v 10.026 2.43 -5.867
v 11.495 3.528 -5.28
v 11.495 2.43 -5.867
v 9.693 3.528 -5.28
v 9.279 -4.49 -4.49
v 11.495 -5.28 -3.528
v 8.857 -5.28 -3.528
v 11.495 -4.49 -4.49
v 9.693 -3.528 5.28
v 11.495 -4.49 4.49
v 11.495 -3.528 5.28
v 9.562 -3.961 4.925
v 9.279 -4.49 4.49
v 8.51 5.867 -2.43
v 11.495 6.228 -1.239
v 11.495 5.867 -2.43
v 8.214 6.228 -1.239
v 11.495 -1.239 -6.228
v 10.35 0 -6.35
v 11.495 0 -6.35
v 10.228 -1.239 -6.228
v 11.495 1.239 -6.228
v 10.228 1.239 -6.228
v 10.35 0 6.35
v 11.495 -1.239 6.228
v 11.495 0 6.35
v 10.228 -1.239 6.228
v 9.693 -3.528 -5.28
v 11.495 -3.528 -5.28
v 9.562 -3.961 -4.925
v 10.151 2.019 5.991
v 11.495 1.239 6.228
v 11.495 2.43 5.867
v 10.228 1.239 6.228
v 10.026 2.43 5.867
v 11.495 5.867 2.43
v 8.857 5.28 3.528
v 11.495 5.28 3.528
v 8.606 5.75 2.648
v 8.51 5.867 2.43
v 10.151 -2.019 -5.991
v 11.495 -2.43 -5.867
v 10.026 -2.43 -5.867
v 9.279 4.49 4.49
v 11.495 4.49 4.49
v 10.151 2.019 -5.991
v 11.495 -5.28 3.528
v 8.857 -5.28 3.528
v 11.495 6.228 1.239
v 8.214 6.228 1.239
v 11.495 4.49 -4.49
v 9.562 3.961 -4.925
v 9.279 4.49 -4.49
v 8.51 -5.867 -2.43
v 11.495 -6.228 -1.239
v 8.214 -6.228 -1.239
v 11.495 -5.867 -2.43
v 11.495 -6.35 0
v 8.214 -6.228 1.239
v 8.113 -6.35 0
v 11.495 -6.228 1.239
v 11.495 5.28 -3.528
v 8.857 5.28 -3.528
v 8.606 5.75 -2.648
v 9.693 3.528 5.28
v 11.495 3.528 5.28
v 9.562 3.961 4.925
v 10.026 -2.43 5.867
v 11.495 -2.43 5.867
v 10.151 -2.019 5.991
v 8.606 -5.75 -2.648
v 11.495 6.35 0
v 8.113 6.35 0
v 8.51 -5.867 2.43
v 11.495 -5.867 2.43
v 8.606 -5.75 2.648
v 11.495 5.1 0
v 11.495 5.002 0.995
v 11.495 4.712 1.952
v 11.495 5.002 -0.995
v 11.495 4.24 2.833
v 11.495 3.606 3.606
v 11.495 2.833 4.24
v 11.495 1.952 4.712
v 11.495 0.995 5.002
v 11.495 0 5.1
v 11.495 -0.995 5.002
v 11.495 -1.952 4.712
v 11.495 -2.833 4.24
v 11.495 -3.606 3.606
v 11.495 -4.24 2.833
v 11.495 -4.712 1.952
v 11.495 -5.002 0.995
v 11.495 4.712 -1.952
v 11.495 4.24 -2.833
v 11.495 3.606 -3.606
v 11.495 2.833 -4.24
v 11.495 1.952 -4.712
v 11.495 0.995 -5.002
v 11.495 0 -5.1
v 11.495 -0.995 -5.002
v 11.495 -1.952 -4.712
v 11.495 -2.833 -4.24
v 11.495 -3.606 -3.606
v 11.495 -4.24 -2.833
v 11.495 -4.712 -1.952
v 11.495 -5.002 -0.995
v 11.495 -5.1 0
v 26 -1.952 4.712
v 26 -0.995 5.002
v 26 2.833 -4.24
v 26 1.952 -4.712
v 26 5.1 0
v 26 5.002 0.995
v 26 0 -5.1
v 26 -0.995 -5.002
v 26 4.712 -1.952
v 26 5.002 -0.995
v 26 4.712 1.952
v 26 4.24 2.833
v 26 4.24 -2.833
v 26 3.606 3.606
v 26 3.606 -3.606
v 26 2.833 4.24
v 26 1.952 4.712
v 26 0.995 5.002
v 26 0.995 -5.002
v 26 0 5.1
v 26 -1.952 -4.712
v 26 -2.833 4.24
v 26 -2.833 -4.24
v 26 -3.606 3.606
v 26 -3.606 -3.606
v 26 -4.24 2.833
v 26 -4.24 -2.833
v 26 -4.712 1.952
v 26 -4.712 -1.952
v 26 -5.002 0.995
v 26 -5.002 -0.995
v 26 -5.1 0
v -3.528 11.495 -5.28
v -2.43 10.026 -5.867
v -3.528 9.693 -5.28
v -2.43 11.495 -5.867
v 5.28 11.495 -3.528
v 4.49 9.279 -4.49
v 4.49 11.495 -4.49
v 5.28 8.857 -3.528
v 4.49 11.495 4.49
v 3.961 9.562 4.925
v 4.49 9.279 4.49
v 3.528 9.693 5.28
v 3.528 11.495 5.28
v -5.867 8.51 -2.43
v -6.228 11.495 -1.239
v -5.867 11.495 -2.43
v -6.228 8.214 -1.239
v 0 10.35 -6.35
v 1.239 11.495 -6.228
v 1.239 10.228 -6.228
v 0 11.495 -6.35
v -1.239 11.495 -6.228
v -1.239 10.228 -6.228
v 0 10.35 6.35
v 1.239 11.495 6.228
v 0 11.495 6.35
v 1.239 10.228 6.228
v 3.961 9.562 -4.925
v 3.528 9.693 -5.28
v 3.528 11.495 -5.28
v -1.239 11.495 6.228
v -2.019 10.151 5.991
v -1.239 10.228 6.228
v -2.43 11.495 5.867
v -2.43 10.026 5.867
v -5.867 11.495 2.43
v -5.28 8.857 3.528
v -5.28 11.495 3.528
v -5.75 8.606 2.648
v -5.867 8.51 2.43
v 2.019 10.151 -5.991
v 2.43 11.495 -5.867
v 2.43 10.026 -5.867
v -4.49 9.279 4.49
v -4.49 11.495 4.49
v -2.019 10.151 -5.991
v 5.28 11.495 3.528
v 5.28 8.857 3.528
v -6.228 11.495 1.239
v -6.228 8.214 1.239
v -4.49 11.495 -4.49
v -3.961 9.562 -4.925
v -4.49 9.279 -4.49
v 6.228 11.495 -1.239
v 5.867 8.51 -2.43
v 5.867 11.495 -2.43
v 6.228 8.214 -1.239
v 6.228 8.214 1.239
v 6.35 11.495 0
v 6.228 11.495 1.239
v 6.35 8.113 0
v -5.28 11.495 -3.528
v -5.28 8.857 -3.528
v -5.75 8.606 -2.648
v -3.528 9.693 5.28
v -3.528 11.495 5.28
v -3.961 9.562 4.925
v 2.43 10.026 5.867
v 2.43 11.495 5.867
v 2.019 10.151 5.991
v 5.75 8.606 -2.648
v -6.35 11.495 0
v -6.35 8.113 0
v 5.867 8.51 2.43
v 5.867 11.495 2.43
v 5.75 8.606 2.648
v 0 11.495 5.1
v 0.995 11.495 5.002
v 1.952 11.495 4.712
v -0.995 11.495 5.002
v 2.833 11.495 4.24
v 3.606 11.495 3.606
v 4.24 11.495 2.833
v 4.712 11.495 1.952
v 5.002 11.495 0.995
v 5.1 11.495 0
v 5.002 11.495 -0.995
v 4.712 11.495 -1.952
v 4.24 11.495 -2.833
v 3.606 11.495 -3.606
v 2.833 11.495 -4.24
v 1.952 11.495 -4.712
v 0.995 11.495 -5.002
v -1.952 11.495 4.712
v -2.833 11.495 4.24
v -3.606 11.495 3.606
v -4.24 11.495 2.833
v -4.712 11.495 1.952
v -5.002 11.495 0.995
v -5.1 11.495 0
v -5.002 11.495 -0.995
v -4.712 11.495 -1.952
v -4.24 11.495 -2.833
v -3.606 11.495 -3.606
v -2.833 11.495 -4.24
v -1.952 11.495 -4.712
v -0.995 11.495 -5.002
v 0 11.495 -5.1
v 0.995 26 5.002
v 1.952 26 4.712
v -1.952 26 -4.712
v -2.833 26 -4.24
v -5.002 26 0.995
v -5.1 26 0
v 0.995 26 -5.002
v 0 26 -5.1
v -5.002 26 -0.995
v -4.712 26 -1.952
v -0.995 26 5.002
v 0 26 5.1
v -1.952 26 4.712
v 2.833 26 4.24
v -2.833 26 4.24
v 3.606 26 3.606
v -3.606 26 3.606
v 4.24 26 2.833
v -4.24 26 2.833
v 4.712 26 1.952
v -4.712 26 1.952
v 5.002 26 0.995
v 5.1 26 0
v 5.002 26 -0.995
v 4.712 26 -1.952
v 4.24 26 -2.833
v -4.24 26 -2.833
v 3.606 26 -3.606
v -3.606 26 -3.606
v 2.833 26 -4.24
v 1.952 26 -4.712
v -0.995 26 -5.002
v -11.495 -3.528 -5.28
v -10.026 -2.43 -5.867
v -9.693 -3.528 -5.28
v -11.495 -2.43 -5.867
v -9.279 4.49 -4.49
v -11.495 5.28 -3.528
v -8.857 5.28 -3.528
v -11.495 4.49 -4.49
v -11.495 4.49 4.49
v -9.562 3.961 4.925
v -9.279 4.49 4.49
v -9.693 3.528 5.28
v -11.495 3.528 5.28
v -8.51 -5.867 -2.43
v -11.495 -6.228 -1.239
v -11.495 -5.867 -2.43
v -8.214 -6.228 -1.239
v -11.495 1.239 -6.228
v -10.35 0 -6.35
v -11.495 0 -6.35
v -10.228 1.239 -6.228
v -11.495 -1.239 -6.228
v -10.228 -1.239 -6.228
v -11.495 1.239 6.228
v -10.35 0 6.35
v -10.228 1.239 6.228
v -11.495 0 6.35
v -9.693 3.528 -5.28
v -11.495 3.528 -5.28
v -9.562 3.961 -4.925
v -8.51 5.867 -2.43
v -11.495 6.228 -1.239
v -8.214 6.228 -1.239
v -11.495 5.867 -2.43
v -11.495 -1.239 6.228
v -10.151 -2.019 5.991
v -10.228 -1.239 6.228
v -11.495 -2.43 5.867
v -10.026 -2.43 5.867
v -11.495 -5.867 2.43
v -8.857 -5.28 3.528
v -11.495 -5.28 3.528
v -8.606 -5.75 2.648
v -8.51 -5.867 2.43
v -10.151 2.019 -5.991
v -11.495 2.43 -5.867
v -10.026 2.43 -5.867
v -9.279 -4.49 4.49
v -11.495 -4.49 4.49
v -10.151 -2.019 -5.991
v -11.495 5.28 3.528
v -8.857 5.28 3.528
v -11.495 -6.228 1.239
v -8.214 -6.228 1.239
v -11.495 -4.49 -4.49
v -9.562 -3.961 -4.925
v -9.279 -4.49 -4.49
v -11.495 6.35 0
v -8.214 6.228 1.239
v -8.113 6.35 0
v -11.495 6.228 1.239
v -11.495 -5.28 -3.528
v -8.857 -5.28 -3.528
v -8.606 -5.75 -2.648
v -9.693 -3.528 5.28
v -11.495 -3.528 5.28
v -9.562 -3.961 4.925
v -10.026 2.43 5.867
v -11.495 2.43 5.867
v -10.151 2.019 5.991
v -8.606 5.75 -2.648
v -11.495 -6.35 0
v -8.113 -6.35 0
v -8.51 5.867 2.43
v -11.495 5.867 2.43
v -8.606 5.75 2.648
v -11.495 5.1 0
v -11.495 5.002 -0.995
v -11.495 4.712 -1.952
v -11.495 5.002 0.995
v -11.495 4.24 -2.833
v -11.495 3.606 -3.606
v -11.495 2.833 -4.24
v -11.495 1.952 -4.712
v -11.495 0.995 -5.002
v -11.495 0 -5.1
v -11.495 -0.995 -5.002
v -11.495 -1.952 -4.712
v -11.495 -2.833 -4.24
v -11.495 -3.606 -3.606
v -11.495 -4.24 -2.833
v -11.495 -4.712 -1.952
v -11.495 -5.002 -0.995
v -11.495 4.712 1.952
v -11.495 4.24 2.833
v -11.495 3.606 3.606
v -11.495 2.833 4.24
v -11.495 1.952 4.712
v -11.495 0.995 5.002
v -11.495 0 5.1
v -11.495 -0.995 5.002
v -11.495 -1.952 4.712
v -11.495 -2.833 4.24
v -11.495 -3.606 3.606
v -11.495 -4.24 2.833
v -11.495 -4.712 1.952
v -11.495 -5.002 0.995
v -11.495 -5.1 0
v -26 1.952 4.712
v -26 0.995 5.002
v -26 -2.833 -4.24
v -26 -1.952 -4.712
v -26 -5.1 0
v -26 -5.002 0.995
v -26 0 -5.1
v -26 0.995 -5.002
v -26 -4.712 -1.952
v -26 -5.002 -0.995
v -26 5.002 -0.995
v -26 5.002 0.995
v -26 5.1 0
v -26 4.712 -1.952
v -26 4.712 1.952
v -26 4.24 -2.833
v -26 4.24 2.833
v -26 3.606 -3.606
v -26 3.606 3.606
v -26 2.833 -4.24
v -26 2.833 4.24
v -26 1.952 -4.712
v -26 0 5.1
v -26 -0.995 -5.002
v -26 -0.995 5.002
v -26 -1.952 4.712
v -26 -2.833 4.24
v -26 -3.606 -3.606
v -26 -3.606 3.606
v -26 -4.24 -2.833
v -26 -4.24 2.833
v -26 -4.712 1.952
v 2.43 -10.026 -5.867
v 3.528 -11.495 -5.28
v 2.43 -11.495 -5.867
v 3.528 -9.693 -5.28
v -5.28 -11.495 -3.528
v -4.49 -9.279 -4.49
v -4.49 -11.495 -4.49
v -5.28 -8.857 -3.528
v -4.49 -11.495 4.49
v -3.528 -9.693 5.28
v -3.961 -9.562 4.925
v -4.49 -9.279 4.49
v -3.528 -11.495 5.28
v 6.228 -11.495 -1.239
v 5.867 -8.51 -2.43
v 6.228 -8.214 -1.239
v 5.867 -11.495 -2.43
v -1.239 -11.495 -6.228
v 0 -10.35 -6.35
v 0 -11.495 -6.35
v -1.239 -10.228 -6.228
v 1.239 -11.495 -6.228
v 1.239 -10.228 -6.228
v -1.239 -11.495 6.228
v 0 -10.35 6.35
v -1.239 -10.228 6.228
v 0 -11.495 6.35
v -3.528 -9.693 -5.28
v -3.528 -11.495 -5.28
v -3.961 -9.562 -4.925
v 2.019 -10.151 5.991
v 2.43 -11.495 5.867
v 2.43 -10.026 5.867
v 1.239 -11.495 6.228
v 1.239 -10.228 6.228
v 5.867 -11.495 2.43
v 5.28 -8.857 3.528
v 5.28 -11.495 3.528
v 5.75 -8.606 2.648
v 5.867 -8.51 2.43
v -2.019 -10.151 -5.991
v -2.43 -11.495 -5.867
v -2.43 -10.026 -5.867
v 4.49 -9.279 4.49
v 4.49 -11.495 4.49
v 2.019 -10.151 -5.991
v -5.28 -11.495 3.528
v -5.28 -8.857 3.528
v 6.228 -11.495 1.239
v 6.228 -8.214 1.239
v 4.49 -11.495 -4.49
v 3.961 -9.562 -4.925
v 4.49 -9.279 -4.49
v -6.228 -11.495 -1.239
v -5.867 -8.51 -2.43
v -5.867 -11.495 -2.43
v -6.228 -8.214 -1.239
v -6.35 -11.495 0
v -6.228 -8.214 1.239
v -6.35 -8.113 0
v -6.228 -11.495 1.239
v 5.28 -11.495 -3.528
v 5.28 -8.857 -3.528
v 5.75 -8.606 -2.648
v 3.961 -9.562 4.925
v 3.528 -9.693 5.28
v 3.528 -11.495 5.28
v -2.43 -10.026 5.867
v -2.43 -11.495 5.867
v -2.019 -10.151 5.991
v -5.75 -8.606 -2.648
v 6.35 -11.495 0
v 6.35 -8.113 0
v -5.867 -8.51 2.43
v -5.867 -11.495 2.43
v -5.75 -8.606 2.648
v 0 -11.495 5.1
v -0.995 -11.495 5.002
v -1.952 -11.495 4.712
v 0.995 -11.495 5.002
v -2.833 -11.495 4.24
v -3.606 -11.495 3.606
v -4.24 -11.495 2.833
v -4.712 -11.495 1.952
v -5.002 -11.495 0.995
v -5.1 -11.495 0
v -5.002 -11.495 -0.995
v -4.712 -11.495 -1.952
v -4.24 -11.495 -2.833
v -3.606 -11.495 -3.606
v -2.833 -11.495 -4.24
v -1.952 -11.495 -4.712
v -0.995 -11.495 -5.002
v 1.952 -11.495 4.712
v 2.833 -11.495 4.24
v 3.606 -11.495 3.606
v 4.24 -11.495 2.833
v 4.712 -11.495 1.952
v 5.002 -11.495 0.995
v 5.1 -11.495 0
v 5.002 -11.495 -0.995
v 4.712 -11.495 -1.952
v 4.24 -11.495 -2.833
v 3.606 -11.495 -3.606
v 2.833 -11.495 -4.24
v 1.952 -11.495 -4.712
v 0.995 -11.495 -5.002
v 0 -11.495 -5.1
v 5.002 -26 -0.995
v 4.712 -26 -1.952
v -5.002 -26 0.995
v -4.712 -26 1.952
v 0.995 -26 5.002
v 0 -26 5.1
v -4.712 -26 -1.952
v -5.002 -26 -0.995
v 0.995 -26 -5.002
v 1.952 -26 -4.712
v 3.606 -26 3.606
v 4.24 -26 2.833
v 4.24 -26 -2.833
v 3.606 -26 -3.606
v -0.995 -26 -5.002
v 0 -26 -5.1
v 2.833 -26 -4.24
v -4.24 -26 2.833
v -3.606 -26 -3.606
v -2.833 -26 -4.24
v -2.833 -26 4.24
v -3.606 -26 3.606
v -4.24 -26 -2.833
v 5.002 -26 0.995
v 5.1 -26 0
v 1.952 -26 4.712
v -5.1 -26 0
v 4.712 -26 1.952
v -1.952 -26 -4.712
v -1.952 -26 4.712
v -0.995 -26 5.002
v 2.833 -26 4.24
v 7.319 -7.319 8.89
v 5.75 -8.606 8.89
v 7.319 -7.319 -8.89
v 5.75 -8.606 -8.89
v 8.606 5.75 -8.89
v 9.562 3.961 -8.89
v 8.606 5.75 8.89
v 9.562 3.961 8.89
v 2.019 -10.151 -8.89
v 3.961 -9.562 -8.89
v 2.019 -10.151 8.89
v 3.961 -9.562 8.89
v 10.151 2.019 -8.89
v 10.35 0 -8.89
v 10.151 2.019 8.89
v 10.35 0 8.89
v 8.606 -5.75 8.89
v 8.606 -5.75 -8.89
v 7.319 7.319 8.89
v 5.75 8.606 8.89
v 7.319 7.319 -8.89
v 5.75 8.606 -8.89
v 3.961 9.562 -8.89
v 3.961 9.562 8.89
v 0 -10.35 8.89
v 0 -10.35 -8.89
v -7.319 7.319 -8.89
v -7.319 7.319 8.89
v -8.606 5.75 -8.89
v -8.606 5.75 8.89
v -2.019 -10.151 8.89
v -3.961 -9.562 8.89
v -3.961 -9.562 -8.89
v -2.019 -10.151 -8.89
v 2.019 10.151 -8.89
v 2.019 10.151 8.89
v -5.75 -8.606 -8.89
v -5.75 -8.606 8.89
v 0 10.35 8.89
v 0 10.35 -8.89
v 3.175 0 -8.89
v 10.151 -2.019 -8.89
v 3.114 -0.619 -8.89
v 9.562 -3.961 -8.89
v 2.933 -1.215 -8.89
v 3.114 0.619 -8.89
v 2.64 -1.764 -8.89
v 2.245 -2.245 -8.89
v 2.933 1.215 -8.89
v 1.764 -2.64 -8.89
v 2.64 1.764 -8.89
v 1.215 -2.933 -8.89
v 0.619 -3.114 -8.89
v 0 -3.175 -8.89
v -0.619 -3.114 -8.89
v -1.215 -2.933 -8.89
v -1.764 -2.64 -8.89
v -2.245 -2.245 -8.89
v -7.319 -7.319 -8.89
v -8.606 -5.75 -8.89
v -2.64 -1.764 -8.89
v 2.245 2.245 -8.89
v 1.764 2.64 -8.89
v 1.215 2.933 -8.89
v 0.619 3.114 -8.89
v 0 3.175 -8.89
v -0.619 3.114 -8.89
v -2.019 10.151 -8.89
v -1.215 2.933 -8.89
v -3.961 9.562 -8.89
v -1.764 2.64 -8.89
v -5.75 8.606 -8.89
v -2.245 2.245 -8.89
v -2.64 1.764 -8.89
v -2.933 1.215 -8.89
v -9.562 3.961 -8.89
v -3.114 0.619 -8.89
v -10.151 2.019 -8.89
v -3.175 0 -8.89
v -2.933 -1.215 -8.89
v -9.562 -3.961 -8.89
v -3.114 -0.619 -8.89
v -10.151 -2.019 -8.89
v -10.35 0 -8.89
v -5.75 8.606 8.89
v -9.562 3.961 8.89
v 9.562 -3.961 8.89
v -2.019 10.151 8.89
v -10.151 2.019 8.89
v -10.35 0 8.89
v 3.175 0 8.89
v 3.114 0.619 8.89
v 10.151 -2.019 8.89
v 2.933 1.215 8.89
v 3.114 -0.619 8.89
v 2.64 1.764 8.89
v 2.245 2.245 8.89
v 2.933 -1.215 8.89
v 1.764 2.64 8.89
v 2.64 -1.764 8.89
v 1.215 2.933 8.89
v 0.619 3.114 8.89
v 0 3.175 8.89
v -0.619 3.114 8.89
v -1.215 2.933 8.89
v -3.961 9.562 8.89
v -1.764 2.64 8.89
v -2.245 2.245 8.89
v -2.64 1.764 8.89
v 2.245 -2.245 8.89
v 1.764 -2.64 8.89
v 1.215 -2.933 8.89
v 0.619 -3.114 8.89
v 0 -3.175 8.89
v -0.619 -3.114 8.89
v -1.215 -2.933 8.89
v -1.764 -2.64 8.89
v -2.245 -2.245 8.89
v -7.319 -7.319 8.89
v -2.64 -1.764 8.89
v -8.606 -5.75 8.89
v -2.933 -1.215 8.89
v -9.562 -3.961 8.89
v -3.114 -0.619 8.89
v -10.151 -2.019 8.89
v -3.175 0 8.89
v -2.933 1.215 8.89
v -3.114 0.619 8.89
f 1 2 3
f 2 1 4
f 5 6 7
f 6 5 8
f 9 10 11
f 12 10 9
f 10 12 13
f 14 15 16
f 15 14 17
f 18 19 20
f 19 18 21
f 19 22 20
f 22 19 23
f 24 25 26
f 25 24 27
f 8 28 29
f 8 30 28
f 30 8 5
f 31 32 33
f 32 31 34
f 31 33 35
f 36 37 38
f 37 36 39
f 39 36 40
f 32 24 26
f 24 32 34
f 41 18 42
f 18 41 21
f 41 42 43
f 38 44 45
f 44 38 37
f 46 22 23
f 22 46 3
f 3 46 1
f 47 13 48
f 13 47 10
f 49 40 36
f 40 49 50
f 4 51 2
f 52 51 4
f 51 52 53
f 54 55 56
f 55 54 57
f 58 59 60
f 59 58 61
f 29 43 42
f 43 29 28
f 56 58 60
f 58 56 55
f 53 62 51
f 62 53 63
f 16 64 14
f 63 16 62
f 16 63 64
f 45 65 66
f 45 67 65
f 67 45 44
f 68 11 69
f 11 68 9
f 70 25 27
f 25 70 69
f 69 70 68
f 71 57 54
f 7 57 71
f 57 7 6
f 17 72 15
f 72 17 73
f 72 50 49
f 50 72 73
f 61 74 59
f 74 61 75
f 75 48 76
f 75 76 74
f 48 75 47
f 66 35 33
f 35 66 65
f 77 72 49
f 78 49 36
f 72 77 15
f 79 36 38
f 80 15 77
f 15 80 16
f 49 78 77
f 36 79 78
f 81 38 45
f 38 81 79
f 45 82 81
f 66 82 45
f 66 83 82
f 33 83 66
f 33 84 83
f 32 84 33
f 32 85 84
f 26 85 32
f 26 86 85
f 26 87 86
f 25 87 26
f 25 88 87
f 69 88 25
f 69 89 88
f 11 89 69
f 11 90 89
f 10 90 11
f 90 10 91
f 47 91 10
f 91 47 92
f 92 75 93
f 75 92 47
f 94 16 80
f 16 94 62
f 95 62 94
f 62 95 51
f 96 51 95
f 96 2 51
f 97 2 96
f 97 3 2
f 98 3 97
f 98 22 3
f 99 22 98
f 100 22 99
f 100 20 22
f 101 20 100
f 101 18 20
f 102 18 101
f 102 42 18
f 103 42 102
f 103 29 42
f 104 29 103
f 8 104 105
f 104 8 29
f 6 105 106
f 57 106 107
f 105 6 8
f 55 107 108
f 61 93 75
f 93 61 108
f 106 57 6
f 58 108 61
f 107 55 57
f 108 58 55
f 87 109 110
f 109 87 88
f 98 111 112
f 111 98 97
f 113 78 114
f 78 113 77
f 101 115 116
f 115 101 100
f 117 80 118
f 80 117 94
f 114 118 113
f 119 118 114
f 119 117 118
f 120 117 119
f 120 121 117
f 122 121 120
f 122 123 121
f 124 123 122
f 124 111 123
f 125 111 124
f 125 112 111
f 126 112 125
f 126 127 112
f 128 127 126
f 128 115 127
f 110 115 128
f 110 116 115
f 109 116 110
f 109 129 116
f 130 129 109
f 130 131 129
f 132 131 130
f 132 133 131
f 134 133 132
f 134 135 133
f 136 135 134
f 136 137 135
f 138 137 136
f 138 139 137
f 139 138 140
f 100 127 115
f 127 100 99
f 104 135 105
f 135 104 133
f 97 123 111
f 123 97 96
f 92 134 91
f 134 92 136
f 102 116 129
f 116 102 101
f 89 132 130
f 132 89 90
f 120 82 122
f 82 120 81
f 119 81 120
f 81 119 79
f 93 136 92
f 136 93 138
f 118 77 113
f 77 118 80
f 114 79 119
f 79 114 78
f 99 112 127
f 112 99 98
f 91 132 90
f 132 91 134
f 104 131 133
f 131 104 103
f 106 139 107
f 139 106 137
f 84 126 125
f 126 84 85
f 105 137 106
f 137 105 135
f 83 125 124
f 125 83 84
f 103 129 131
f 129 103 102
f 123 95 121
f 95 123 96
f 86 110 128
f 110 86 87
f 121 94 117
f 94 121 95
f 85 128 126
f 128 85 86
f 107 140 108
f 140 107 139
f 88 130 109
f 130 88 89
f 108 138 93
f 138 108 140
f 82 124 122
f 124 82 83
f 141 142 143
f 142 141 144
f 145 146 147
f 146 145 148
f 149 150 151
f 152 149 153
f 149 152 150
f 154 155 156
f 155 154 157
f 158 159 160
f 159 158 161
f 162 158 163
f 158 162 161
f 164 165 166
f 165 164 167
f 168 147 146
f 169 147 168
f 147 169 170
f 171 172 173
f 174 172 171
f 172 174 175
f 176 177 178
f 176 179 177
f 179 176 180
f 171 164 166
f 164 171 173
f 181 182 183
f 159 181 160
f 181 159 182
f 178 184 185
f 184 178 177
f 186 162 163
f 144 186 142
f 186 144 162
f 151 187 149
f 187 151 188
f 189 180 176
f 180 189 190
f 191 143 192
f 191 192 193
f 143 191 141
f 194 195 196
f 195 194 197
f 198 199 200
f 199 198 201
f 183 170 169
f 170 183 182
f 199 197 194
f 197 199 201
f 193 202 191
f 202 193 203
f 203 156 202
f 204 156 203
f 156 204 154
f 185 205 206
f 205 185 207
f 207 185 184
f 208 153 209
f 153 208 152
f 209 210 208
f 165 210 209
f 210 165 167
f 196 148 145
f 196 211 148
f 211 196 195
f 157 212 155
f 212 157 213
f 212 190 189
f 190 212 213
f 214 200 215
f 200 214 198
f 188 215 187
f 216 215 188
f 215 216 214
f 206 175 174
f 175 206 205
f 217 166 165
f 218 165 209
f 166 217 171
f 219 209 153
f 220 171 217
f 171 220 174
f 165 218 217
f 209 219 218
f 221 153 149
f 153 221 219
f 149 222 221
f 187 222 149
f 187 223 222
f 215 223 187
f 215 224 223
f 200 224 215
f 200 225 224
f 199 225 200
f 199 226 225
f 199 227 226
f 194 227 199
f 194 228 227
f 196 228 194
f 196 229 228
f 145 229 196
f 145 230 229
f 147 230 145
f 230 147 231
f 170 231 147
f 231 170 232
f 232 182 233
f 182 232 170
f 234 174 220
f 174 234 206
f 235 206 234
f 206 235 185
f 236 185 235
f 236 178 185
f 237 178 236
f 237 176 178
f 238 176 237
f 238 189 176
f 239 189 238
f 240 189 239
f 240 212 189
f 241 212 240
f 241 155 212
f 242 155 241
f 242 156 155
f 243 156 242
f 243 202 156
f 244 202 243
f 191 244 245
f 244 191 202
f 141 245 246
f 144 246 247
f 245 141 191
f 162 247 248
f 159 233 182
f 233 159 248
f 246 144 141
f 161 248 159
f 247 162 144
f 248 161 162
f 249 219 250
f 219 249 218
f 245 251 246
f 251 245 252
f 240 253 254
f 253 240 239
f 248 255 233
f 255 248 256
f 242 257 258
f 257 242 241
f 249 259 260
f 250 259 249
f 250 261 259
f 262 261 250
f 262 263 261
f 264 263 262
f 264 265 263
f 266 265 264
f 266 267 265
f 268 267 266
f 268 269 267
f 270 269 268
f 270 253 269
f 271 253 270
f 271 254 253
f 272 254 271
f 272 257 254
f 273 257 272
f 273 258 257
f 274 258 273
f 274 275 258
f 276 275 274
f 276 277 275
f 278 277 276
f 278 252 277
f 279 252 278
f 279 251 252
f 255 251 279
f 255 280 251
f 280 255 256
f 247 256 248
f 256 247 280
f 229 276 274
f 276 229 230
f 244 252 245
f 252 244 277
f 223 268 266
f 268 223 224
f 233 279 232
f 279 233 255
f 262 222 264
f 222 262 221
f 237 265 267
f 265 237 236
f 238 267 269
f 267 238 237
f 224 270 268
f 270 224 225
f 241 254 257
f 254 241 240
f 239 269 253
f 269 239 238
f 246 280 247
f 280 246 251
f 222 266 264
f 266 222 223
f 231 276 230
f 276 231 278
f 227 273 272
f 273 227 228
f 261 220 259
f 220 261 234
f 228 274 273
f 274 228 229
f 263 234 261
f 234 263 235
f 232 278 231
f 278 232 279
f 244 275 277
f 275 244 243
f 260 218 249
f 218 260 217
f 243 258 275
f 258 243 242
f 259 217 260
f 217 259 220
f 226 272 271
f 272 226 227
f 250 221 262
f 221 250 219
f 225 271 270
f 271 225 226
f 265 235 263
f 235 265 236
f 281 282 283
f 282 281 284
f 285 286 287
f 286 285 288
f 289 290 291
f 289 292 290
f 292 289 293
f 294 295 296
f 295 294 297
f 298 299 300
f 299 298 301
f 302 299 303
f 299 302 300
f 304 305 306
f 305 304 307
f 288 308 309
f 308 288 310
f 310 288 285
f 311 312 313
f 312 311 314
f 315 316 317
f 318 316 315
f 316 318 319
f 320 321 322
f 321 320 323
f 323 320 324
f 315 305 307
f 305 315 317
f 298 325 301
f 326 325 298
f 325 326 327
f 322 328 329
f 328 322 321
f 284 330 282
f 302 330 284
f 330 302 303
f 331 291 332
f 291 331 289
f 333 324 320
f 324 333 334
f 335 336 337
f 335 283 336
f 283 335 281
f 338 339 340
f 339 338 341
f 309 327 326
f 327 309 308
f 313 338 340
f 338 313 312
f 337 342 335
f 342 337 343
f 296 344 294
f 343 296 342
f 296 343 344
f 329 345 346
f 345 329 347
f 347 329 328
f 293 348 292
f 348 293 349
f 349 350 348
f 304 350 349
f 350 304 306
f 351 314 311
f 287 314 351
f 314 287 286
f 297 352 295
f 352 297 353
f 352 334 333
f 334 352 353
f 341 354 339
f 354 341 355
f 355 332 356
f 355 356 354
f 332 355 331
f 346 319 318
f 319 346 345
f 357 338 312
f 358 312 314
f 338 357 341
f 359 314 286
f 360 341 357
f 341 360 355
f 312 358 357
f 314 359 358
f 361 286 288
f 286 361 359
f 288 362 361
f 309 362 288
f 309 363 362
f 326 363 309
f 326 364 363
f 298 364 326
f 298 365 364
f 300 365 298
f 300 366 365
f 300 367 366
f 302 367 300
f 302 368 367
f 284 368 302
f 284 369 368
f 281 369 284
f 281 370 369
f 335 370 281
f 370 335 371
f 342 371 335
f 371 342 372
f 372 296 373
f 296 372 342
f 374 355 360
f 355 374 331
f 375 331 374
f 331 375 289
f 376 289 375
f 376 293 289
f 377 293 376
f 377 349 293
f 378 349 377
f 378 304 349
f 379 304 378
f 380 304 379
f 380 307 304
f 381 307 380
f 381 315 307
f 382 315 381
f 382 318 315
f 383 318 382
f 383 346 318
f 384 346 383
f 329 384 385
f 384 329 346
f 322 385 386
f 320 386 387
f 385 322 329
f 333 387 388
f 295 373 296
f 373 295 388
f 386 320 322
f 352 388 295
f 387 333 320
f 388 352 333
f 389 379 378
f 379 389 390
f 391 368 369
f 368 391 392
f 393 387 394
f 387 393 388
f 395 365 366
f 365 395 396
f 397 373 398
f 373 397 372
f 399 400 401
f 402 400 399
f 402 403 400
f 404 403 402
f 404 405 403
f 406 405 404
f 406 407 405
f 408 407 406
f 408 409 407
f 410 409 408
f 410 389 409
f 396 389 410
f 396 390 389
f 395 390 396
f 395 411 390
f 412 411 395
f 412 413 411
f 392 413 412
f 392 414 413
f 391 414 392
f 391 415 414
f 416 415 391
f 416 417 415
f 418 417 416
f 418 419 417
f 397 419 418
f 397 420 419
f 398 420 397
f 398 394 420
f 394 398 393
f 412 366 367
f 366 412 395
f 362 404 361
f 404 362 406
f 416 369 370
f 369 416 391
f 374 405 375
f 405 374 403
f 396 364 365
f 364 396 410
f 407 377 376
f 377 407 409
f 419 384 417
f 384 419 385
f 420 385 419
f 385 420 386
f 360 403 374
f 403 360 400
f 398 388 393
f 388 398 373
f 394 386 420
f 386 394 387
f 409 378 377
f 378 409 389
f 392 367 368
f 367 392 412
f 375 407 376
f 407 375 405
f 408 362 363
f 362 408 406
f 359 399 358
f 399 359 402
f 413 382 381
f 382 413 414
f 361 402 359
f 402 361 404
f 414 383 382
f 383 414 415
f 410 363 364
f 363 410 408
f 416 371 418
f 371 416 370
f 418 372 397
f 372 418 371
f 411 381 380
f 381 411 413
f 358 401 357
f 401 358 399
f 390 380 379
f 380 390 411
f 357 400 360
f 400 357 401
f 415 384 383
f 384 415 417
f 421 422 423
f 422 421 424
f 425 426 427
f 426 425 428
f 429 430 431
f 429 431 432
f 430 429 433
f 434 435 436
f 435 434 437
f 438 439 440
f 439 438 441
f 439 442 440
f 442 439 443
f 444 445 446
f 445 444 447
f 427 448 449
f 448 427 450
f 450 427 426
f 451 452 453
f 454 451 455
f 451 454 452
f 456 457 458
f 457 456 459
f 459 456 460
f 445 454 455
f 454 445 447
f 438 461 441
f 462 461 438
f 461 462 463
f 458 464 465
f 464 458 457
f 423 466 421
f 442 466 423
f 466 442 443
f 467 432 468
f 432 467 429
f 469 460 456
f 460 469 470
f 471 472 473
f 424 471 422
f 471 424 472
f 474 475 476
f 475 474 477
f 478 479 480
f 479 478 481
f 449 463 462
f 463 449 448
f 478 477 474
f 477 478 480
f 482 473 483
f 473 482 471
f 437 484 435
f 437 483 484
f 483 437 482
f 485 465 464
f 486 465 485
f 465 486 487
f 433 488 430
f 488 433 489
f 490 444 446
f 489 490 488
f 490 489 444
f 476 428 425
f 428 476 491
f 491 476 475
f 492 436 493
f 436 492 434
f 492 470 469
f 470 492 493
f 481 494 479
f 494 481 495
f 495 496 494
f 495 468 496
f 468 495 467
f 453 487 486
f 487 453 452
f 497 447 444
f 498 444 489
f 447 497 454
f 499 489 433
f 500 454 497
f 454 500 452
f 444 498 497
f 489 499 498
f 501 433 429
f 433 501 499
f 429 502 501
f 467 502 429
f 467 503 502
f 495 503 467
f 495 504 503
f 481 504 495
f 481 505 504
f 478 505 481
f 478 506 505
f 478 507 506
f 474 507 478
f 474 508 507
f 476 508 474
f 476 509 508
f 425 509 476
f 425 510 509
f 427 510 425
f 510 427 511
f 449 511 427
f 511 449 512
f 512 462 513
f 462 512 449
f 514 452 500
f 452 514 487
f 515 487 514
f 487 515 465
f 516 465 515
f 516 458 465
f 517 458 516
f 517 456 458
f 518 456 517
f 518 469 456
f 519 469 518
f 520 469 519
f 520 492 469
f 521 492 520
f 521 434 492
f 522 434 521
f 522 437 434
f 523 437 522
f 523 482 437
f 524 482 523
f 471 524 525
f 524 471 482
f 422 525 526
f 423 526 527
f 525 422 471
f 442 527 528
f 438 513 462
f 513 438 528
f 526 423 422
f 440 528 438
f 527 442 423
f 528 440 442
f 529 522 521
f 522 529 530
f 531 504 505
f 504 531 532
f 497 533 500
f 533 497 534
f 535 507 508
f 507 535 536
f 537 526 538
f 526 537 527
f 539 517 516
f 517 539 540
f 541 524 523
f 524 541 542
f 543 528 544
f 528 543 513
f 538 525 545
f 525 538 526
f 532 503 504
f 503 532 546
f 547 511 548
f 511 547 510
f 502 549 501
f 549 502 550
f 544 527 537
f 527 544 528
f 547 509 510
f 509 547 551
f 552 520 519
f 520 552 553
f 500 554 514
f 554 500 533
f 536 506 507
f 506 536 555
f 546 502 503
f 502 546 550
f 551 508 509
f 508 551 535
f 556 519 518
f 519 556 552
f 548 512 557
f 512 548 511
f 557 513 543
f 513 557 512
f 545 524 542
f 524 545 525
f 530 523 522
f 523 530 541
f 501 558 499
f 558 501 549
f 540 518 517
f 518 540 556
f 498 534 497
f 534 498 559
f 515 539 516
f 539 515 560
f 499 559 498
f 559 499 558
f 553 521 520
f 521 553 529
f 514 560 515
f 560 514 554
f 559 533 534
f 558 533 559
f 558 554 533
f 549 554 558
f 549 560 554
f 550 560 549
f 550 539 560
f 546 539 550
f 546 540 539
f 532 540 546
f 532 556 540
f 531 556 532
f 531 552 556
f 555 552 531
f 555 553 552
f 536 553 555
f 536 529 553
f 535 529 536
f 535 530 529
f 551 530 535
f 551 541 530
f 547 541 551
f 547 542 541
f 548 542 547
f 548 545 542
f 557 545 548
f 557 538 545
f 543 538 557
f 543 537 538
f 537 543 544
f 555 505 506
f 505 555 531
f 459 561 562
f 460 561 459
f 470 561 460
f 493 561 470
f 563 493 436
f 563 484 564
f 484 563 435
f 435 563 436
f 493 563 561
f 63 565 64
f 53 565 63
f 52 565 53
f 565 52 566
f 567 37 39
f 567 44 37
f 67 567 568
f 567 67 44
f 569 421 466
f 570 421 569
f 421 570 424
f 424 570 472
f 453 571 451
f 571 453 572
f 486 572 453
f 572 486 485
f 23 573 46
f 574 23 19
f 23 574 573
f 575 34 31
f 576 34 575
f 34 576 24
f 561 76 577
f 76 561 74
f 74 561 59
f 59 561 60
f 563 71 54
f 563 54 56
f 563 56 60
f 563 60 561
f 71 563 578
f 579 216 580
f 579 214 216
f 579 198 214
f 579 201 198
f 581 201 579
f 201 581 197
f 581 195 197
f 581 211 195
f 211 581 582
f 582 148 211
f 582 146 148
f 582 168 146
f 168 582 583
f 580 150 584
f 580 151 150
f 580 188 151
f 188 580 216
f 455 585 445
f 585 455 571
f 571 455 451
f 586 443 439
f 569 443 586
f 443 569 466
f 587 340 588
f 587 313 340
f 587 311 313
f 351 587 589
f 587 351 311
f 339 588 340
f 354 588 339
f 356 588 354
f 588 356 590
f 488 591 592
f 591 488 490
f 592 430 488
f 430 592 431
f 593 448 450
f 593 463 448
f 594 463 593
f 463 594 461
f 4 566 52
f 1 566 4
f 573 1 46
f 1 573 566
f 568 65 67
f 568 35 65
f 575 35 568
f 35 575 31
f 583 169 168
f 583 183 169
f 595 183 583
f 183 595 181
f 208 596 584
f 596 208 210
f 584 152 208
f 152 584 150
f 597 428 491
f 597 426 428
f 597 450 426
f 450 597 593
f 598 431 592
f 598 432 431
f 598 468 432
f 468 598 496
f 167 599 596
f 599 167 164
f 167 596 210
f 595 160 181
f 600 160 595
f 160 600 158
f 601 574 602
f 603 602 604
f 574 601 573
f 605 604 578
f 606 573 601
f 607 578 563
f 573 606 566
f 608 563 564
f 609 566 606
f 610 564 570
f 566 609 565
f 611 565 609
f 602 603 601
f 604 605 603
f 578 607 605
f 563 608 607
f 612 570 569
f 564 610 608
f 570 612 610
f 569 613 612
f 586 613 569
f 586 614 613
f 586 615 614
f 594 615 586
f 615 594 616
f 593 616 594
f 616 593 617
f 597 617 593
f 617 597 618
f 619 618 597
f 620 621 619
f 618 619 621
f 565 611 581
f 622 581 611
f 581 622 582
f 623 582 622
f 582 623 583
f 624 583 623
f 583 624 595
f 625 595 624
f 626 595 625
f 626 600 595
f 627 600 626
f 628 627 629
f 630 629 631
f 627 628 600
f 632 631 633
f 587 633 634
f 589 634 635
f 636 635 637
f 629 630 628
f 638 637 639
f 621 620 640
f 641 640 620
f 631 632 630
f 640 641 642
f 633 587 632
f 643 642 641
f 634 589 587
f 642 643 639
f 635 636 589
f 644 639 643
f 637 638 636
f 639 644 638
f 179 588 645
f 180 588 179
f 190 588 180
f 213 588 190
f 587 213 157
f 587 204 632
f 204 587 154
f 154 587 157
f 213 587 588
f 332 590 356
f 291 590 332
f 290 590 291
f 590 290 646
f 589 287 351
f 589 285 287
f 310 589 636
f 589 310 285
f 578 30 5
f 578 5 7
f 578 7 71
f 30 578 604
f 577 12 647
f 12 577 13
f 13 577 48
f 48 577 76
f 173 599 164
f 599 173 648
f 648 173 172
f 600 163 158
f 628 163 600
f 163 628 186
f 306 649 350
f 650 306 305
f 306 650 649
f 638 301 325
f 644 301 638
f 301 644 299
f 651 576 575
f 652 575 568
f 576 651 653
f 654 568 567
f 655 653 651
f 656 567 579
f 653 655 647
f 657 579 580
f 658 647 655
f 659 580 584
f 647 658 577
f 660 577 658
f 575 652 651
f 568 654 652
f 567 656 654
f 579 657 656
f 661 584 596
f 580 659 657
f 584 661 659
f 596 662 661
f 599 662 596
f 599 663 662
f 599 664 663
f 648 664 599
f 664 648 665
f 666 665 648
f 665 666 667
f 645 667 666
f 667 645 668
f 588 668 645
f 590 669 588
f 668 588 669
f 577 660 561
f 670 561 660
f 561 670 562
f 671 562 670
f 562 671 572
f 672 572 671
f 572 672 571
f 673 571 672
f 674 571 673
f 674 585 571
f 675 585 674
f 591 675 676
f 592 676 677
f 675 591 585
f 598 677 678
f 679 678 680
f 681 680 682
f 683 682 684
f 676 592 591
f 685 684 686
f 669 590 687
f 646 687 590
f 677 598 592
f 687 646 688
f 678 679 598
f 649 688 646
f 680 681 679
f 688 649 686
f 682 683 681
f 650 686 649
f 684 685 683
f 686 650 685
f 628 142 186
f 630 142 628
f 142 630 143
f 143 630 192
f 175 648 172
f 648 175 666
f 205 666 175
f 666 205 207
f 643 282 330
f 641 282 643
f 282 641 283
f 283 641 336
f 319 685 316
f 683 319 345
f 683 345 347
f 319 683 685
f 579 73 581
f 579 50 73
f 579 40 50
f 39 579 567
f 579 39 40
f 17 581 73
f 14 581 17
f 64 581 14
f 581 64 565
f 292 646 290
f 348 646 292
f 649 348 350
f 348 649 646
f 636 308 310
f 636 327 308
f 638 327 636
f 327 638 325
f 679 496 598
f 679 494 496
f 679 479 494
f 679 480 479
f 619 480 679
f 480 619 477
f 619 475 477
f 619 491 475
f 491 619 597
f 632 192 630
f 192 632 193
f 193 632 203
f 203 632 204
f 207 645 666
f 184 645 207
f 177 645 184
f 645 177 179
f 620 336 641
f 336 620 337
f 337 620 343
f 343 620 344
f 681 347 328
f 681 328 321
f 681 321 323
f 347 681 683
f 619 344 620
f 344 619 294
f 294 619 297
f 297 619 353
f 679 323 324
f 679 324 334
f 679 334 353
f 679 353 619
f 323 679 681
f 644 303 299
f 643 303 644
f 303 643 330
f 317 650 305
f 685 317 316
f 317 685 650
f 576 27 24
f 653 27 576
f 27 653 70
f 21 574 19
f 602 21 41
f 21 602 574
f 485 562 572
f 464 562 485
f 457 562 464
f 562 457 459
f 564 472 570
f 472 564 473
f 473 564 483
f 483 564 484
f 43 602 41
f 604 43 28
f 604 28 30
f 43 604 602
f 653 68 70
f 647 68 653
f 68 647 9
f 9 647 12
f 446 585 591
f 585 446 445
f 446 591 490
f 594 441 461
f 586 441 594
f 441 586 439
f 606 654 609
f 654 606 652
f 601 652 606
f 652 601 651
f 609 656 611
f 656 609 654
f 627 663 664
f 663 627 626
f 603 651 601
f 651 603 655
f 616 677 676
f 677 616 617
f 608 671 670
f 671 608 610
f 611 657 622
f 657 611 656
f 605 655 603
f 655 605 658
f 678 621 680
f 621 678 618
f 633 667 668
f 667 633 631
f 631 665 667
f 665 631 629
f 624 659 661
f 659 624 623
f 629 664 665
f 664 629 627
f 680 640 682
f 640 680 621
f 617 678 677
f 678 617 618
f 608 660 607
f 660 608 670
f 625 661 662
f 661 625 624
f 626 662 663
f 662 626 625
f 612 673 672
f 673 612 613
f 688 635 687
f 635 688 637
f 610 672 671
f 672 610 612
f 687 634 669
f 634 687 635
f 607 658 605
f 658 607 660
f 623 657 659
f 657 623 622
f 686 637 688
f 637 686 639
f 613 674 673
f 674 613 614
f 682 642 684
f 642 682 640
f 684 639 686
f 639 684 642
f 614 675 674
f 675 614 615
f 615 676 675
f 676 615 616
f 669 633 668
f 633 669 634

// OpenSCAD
$fn = 32;

// ----------------------------------------------------------------------
// Cardan cross: 52 mm span, 12.7 mm trunnions
// ----------------------------------------------------------------------

// --- parameters (mm) ---
journal_d = 12.7;         // trunnion diameter
arm_len = 26;             // trunnion length from the centre
step_r = 4.32;            // step position from the centre
step_d = 10.2;            // journal diameter after the step
hub_d = 20.7;             // hub diameter
hub_h = 17.78;            // hub height
bore_d = 6.35;            // hub bore

difference() {
  union() {
    /* hub along the joint axis */
    cylinder(h = hub_h, d = hub_d, center = true);
    for (a = [0 : 90 : 270]) rotate([0, 0, a]) {
      /* trunnion, sunk into the hub */
      translate([hub_d / 4, 0, 0]) rotate([0, 90, 0]) cylinder(h = step_r + 2, d = journal_d);
      /* stepped journal out to the tip */
      translate([step_r - 0.5, 0, 0]) rotate([0, 90, 0]) cylinder(h = arm_len + 0.5 - step_r, d = step_d);
    }
  }
  /* lubrication bore through the hub, 2.5 mm clear on both sides */
  translate([0, 0, -hub_h / 2 - 2.5]) cylinder(h = hub_h + 5, d = bore_d);
}
